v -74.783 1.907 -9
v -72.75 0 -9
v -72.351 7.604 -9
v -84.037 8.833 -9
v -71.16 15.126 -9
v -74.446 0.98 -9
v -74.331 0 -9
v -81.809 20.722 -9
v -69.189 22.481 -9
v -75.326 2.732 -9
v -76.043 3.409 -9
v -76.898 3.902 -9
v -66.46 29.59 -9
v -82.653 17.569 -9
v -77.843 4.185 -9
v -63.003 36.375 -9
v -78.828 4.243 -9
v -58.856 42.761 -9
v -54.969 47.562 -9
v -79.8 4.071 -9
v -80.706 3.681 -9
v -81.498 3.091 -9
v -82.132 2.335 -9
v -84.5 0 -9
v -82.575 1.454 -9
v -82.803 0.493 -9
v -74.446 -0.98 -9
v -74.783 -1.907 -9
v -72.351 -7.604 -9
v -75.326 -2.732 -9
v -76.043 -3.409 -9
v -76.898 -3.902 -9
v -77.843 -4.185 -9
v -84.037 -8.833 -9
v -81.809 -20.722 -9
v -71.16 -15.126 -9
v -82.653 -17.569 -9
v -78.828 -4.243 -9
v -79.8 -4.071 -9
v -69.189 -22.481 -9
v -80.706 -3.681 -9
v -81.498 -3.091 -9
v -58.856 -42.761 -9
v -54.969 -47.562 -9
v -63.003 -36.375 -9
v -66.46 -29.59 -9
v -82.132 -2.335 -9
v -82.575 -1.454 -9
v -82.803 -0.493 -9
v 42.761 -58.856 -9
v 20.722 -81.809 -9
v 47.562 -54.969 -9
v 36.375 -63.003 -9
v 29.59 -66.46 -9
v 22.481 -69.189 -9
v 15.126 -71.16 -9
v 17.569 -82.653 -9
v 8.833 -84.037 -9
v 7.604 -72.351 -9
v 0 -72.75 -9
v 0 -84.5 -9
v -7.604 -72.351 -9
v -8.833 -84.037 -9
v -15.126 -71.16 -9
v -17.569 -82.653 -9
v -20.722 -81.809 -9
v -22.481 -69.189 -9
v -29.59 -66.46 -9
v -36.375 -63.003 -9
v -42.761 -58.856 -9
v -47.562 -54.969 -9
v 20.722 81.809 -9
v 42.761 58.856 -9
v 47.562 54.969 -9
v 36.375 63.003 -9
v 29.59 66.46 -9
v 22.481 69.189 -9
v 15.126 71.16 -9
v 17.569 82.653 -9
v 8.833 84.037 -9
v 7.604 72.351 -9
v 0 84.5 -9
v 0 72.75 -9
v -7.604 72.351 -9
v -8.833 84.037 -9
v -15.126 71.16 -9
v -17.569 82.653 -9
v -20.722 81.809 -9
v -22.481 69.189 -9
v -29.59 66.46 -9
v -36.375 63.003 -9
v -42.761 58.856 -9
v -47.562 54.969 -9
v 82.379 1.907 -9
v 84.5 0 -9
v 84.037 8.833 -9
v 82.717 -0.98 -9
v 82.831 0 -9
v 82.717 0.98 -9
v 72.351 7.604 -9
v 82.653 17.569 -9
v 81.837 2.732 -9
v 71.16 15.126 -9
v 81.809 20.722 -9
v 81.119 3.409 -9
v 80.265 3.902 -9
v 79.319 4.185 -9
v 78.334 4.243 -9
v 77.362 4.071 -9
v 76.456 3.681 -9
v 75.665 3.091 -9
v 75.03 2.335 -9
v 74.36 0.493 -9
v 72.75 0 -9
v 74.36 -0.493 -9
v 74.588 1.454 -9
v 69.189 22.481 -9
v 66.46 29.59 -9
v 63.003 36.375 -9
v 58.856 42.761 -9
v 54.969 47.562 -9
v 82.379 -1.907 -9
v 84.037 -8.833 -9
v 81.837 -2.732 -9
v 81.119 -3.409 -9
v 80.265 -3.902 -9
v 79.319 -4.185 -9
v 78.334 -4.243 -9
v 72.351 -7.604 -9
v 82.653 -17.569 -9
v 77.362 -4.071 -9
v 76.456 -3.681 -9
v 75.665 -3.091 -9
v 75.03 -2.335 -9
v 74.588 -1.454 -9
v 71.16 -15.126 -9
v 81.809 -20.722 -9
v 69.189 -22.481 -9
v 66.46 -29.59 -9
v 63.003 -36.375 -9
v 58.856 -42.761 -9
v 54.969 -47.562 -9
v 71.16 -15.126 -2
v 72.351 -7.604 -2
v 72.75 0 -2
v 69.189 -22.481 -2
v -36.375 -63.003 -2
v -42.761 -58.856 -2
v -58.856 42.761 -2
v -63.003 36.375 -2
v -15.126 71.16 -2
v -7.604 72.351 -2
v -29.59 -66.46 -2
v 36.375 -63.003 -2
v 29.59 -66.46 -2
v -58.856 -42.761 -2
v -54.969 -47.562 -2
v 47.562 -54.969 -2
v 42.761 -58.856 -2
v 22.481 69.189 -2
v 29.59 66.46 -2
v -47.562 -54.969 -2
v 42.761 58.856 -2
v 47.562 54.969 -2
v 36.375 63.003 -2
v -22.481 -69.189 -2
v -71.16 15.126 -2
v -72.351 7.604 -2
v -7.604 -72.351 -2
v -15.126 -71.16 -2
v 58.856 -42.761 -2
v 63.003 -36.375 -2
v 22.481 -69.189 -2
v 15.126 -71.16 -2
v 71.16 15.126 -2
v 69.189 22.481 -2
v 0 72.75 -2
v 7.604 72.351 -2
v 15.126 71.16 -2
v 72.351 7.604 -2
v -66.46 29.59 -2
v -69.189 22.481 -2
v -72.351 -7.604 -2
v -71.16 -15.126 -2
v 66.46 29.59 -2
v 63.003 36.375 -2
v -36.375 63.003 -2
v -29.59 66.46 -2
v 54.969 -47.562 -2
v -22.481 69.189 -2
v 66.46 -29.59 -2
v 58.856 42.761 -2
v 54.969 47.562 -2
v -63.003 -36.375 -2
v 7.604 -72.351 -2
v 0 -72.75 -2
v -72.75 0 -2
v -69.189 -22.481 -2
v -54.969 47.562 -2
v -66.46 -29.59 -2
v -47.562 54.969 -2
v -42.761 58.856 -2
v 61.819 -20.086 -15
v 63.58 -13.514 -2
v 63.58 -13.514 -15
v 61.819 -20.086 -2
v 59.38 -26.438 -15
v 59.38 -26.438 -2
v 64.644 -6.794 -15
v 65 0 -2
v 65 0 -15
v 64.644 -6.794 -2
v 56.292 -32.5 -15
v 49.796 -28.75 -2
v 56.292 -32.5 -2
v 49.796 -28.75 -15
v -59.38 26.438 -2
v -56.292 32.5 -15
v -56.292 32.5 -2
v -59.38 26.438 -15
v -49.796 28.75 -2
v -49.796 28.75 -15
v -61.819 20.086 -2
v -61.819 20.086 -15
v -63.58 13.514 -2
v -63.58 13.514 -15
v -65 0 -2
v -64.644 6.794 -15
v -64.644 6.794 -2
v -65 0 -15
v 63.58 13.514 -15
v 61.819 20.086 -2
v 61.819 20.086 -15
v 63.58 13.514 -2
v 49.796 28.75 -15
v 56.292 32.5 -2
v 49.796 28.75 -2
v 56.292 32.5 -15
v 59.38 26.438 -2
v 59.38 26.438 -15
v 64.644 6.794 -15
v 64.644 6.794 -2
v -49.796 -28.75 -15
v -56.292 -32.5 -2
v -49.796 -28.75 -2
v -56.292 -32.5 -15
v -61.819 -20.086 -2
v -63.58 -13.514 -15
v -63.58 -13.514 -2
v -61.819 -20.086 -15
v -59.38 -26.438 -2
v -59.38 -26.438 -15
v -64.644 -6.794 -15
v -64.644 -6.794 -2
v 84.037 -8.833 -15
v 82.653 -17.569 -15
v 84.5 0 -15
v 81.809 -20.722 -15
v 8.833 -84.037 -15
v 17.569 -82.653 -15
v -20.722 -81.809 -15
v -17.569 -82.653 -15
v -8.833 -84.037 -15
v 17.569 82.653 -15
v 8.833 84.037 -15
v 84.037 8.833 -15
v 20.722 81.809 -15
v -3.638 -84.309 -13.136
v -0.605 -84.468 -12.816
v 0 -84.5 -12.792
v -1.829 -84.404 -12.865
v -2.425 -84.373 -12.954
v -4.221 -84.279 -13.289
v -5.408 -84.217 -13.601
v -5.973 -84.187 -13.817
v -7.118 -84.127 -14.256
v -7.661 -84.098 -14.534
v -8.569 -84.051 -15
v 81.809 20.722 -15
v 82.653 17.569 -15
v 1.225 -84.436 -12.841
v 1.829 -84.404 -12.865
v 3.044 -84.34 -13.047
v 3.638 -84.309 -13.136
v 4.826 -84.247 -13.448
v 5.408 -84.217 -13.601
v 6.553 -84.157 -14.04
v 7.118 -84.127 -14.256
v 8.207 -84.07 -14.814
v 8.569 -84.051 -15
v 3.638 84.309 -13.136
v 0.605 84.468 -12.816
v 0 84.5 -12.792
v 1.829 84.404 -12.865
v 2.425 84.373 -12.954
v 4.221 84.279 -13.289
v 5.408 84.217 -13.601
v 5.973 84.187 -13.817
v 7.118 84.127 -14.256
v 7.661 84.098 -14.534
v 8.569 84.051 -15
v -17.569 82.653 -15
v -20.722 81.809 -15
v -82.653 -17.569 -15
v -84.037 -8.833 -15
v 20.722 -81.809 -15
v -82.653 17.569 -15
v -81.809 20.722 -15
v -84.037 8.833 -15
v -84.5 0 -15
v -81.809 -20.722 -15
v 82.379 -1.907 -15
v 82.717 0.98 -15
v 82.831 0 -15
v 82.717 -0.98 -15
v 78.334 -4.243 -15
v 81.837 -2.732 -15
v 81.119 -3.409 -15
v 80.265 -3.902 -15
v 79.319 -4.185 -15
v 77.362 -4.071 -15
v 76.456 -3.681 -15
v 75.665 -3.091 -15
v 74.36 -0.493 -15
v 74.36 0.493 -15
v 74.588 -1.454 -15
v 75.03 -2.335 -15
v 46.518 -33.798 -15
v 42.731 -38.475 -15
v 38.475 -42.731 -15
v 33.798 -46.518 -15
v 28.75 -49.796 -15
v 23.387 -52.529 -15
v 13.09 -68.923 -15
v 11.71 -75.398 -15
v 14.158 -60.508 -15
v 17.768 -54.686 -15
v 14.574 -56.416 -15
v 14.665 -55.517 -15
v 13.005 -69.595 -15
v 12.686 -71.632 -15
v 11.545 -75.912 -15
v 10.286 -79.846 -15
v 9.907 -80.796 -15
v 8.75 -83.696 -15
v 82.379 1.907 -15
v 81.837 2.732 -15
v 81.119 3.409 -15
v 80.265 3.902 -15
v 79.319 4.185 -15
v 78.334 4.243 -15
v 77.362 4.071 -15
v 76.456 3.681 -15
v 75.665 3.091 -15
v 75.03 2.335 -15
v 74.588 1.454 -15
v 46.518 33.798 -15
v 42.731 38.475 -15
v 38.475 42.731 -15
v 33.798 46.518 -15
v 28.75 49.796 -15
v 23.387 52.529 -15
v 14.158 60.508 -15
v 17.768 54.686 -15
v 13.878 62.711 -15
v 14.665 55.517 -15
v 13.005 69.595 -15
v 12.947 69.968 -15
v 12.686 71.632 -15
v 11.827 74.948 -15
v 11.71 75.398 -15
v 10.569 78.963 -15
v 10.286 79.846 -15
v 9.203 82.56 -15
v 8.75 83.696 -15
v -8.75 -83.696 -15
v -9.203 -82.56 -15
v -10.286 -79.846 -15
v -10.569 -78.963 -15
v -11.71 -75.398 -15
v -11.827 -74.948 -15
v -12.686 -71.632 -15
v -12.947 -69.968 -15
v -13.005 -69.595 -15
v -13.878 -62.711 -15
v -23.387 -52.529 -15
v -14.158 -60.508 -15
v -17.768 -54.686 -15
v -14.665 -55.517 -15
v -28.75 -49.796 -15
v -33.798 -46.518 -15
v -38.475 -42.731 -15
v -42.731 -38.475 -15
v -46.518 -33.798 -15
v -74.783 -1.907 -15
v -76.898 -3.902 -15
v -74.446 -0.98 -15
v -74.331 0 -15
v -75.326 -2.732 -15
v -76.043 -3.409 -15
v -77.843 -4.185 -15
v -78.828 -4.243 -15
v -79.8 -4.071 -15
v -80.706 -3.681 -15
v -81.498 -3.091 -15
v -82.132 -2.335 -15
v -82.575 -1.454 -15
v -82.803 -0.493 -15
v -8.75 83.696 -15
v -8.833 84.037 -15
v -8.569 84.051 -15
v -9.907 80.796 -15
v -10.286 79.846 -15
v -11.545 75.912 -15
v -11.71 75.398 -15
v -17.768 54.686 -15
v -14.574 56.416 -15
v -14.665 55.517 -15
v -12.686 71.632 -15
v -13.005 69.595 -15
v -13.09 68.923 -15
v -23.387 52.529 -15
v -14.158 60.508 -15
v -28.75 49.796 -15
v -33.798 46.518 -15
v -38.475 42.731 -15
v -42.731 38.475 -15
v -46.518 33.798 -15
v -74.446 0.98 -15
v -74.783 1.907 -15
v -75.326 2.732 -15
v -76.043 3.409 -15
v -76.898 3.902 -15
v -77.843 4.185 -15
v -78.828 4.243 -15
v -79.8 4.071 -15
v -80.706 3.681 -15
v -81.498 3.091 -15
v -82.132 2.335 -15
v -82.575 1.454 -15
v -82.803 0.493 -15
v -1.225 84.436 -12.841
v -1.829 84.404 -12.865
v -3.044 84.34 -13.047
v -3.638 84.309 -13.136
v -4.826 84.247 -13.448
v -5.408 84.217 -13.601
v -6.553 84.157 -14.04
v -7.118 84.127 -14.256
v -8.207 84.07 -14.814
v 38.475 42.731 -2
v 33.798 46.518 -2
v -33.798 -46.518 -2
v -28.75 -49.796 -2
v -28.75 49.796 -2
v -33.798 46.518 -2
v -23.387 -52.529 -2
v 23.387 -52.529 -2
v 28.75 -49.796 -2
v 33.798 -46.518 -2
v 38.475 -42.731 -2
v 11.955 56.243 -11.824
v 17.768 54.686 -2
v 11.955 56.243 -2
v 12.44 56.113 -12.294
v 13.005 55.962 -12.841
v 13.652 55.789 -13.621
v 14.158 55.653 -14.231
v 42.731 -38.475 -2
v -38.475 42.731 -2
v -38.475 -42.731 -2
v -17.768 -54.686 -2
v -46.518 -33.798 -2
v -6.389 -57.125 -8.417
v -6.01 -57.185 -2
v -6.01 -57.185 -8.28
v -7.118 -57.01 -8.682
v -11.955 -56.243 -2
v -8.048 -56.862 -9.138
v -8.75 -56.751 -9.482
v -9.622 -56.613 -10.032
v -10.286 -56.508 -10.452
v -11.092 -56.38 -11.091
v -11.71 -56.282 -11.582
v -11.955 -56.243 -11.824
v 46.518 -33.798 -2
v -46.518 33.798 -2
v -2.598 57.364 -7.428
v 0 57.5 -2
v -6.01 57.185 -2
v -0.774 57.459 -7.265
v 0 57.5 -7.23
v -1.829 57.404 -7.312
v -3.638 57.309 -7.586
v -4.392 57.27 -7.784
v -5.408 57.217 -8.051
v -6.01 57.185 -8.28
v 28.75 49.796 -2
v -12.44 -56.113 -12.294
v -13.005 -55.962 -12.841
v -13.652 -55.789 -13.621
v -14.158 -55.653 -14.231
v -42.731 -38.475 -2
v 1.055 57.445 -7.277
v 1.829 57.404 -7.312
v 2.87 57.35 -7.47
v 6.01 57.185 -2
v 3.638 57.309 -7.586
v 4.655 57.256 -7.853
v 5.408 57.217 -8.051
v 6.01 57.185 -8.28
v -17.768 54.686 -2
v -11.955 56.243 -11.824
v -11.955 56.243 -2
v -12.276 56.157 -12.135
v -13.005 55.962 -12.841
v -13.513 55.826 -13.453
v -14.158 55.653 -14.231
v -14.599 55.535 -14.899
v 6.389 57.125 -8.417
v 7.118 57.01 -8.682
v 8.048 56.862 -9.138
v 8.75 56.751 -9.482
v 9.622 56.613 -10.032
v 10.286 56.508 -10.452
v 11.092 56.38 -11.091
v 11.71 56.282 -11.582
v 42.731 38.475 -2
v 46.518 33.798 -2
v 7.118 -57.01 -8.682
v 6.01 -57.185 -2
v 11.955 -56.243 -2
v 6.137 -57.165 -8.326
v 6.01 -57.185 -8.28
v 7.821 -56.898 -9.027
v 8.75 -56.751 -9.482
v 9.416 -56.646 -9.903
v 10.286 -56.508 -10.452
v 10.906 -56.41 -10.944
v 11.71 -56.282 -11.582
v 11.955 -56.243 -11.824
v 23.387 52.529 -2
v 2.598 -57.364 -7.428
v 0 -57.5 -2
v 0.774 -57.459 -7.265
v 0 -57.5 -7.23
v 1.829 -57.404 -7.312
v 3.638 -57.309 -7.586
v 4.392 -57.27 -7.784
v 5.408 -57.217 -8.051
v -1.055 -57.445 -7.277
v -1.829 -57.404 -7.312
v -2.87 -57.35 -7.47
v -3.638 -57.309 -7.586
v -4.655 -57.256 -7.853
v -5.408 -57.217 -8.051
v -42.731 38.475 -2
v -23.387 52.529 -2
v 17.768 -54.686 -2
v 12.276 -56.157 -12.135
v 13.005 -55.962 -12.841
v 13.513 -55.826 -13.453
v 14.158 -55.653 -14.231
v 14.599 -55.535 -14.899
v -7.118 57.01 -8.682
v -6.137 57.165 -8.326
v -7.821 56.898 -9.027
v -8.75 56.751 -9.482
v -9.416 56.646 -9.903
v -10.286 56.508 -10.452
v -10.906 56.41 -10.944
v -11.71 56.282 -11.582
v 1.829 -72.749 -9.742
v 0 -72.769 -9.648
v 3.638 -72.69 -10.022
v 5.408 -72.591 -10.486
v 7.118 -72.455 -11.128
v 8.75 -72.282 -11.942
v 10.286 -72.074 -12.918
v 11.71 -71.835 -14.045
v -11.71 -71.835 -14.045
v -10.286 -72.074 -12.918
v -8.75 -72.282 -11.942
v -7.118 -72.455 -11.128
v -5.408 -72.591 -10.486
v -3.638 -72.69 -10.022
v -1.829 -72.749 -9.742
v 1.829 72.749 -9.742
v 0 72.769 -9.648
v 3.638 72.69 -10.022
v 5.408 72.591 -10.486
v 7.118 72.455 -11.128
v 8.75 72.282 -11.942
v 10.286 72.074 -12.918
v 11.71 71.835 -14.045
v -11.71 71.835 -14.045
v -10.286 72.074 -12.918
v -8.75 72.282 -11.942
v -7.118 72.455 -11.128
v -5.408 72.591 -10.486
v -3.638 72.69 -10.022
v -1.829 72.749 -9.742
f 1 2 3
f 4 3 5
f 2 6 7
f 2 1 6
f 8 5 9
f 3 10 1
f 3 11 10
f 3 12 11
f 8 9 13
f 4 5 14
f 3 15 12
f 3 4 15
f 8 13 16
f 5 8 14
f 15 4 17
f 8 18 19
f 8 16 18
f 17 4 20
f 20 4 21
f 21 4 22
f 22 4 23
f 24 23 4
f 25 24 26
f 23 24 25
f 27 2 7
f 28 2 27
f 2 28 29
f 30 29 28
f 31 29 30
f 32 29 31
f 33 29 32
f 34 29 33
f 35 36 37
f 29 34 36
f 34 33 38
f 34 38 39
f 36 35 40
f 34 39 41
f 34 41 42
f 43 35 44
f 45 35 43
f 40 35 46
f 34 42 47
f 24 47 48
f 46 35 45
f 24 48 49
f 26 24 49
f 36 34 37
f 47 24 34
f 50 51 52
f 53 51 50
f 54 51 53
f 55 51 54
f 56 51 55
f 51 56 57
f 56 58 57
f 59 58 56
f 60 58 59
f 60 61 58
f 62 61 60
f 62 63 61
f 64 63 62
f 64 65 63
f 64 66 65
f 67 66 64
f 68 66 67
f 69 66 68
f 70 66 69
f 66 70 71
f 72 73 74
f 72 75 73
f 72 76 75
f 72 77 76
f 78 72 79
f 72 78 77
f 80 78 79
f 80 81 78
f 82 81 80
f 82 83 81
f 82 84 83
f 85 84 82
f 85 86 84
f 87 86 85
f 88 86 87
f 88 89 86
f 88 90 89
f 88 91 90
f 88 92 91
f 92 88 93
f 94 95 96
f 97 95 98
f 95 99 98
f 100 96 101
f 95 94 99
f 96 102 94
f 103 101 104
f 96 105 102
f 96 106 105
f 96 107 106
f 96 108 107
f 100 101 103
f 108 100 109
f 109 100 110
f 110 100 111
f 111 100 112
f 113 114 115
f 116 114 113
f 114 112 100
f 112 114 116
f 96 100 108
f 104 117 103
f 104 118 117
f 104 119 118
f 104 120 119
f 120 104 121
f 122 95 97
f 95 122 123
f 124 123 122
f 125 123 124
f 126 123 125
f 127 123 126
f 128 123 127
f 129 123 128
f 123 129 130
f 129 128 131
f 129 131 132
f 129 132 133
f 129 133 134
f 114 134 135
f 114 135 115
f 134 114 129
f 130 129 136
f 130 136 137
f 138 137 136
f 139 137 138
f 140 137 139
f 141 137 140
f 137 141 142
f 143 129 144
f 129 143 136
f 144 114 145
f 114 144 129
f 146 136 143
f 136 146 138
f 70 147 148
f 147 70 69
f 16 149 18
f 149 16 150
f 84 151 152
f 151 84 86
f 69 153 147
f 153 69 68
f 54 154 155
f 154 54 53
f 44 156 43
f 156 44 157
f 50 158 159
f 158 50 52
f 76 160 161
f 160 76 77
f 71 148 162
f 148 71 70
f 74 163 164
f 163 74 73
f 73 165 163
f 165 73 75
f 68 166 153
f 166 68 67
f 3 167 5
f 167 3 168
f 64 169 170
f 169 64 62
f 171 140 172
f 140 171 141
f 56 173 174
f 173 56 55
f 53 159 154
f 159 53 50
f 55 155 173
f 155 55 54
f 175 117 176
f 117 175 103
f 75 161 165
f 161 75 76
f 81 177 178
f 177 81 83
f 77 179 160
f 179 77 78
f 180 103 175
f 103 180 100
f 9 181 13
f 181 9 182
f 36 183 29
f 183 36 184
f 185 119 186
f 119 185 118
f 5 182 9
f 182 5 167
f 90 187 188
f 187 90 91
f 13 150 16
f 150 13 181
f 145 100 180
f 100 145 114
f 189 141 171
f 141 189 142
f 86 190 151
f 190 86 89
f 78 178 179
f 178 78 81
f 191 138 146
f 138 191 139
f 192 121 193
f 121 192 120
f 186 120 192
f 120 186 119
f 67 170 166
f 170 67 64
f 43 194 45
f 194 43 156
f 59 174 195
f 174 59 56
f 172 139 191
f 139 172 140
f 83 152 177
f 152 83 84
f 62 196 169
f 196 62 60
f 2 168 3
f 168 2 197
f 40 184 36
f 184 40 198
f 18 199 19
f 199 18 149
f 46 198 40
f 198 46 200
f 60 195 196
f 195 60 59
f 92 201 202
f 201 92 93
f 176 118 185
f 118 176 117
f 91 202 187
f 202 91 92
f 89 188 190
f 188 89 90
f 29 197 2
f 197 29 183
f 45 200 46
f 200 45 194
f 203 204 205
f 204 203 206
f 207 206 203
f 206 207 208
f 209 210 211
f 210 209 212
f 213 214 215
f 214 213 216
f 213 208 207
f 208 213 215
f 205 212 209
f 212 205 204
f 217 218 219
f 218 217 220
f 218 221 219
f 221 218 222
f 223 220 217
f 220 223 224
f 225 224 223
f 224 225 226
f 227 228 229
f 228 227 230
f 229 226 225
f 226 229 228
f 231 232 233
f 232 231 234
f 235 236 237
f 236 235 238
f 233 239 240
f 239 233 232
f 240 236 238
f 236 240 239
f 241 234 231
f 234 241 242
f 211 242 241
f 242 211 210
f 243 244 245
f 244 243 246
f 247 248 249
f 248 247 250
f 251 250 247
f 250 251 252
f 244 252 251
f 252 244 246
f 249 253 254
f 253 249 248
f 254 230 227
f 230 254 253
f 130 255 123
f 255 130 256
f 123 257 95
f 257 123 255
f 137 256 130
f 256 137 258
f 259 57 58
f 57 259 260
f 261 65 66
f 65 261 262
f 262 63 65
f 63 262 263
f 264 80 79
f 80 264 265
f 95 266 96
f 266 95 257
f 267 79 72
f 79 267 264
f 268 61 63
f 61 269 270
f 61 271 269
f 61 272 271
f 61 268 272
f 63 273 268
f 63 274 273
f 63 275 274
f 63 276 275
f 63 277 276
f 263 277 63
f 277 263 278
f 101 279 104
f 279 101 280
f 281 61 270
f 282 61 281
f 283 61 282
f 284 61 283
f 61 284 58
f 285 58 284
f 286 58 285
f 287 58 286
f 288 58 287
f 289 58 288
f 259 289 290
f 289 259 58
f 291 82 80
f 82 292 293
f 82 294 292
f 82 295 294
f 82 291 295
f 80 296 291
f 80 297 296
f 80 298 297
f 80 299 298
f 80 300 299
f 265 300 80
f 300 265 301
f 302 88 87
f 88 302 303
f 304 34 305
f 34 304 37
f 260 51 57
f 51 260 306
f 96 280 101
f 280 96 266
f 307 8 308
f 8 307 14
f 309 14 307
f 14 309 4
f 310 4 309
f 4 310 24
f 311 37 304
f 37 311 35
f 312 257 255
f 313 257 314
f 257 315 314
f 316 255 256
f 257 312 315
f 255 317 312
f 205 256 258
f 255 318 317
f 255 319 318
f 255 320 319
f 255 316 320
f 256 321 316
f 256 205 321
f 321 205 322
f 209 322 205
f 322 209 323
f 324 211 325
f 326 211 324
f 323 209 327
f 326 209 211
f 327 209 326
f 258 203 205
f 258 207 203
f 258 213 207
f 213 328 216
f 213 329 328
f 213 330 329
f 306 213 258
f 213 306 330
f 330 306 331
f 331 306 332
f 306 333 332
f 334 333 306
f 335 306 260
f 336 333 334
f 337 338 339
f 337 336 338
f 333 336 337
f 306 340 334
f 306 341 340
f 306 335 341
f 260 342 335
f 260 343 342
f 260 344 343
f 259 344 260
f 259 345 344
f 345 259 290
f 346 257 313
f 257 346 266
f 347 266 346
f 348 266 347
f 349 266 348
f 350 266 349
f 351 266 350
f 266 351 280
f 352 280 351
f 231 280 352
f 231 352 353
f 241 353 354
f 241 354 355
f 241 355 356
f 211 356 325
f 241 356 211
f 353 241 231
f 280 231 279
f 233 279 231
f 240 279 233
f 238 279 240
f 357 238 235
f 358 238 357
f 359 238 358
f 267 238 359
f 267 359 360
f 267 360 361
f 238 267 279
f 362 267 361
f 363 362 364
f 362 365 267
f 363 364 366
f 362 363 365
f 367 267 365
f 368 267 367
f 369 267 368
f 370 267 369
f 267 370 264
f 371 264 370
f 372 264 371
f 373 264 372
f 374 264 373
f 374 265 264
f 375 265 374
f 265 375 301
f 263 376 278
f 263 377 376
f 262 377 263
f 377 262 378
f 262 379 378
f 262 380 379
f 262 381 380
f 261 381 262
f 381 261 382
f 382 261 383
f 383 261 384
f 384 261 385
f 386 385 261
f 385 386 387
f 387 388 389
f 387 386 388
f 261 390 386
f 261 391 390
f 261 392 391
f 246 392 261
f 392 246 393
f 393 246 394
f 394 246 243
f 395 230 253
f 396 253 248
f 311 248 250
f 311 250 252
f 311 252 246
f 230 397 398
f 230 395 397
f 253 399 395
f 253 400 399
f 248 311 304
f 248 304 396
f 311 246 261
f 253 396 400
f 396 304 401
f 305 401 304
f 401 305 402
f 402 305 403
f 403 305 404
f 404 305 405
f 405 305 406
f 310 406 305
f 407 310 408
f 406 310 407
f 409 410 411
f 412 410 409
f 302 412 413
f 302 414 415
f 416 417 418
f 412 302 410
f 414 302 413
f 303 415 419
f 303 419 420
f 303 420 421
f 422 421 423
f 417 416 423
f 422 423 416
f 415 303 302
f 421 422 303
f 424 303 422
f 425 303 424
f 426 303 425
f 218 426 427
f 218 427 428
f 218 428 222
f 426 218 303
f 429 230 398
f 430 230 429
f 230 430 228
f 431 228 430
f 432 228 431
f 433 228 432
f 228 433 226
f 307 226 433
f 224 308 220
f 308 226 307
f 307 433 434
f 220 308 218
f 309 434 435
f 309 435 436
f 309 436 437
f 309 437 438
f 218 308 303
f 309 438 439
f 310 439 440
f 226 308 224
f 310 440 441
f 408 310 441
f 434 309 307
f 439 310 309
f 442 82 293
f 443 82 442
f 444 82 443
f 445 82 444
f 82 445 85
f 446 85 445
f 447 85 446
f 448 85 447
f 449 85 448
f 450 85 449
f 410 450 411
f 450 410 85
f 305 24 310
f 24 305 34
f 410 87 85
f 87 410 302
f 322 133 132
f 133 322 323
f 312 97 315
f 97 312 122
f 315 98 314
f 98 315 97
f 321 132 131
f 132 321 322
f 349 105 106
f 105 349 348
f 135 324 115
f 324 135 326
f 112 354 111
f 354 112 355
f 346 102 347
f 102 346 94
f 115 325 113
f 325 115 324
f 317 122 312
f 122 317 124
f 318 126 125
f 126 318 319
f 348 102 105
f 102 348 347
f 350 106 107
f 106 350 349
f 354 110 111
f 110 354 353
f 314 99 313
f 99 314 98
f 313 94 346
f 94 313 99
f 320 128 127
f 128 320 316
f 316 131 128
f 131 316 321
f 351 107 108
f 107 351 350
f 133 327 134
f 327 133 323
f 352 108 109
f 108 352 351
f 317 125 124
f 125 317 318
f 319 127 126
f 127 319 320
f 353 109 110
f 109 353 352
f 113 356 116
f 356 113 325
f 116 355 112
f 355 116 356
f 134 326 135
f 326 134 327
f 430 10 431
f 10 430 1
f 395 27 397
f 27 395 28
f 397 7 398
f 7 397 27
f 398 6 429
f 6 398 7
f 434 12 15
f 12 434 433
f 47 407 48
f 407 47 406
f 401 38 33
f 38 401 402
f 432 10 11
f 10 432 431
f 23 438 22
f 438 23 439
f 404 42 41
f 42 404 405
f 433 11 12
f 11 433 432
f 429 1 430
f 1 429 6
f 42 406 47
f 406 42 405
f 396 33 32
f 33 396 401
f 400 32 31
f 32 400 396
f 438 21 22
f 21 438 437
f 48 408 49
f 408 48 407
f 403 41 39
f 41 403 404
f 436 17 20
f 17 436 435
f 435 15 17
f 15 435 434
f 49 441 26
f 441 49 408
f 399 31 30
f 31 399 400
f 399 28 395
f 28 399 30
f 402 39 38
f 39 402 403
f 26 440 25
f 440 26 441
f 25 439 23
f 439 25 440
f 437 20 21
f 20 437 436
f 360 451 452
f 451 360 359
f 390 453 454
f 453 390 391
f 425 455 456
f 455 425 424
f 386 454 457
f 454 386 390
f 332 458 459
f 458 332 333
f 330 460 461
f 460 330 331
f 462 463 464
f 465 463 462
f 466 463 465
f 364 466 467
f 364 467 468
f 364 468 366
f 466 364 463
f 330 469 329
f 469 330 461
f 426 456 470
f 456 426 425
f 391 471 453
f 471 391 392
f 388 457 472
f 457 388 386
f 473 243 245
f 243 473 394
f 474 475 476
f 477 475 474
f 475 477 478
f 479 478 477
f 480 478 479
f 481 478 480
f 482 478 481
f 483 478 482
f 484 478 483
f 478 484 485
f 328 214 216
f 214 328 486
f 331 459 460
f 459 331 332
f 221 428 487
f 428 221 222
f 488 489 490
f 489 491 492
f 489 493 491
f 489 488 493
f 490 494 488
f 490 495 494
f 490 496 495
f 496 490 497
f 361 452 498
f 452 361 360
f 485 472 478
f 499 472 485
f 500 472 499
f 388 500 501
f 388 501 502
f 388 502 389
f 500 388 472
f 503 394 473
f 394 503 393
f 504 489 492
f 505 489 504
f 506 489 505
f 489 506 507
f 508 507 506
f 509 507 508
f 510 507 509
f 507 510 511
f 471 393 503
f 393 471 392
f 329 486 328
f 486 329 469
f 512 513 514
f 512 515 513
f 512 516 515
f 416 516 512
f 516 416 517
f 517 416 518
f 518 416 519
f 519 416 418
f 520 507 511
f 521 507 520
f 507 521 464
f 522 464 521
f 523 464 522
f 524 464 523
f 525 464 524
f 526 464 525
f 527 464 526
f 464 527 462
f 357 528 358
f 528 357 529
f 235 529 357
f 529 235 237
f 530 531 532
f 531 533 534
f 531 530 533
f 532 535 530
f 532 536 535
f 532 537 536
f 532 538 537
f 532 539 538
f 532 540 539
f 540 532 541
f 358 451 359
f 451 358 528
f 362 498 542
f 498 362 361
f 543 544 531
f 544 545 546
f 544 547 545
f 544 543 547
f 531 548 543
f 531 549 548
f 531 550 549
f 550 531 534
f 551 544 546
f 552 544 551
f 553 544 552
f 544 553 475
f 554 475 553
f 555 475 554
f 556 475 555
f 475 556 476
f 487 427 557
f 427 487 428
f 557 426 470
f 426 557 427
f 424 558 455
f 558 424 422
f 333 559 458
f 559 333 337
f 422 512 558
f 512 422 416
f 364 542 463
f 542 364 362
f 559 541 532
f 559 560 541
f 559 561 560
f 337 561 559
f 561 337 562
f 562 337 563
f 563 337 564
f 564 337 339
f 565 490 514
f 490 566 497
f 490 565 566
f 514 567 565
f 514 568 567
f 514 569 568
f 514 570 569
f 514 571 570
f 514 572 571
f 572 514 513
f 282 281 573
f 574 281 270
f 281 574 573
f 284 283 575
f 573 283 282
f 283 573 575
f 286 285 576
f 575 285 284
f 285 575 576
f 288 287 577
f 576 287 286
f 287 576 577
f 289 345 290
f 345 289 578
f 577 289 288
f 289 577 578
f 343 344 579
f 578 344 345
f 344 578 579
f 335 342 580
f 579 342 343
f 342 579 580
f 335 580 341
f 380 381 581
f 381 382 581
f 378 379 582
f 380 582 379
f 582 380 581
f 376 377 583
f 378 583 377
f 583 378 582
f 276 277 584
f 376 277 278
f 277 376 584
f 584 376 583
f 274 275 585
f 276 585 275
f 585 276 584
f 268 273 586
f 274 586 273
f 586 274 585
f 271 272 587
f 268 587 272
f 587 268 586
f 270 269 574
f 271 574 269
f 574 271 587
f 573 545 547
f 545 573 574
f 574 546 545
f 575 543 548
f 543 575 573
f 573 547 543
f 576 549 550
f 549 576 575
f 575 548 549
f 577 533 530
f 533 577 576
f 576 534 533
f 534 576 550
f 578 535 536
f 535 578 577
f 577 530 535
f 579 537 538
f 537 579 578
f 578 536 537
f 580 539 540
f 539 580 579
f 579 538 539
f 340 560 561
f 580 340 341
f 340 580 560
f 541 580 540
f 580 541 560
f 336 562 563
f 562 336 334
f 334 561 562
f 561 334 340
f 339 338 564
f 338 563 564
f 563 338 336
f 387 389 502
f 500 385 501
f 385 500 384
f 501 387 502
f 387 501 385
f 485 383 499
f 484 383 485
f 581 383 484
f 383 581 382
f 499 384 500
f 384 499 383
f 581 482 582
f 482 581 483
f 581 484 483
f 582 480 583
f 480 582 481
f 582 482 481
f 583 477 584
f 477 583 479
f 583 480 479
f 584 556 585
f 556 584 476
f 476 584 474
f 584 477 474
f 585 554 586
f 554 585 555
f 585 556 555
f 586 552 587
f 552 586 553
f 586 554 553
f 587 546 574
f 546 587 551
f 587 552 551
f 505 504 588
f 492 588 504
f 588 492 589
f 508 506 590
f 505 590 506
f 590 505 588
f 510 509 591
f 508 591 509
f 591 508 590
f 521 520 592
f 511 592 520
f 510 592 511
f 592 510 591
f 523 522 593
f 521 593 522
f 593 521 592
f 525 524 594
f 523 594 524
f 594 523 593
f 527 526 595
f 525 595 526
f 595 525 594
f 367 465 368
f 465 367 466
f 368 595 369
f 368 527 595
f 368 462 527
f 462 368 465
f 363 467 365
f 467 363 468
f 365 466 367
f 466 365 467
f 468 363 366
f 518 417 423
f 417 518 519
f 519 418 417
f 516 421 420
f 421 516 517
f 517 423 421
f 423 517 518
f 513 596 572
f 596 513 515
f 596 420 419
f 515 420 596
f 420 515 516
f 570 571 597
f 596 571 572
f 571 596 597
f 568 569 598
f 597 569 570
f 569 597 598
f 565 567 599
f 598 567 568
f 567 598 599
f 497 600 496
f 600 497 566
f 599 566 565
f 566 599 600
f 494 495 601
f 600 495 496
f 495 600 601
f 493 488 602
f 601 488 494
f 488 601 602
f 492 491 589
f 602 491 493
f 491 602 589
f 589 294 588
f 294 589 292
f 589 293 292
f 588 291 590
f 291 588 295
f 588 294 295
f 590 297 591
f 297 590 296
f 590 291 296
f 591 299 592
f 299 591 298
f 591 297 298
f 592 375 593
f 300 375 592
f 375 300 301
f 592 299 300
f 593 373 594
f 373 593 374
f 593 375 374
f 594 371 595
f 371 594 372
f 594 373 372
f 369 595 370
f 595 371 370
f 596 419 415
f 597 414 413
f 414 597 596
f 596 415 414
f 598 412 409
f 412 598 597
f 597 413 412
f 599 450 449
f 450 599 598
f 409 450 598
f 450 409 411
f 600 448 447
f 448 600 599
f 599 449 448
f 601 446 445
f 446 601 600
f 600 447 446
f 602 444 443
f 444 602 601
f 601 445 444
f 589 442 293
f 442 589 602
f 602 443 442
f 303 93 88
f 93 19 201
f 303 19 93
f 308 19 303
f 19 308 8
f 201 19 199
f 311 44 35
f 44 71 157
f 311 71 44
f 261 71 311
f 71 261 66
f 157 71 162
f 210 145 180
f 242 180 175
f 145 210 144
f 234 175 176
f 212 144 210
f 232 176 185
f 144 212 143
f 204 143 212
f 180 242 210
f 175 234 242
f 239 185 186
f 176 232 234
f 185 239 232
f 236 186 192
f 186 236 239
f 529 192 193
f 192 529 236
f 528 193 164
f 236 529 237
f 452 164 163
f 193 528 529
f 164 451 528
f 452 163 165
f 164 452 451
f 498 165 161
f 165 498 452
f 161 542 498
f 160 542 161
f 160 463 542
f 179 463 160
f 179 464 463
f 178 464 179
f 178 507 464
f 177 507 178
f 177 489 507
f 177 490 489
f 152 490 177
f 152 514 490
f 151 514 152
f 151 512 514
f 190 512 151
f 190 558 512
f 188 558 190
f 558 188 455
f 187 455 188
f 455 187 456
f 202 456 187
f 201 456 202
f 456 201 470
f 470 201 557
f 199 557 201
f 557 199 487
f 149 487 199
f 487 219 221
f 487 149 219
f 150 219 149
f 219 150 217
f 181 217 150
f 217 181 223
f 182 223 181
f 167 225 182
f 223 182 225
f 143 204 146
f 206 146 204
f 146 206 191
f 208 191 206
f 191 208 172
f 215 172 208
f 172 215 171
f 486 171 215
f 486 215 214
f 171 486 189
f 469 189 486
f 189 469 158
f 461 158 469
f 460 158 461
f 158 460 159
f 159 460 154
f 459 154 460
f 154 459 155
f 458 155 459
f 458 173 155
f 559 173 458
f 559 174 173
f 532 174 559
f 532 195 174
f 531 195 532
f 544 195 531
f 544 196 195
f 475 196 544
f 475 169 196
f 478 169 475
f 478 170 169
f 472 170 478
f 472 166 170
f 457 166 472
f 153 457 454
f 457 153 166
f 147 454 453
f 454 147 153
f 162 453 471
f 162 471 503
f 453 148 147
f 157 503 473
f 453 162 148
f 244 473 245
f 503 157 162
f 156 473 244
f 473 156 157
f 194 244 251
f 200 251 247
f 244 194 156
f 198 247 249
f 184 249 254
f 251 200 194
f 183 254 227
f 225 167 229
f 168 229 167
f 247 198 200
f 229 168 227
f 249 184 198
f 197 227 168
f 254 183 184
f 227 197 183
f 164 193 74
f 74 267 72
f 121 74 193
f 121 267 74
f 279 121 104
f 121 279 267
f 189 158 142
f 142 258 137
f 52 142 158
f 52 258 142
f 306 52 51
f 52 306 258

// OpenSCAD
$fs = 1;
$fa = 6;

module tire(args) {
  translate([0, 0, 350]) rotate([0, 90, 0]) rotate_extrude() {
    translate([350 - 35/2, 0, 0]) circle(d=35);
  }
}

module innerRing(args) {
  difference() {
    cylinder(d=146 + 24, h=9, center=false);
    cylinder(d=145.5, h=100, center=true);
  }
}

holeD = (6 + 3/16) * 25.4;

rotate([180,0,0]) // flip for printing
intersection() {
  difference() {
    cylinder(d=145 + 24, h=15, center=false);
    innerRing();

    translate([holeD/2,0,0]) cylinder(d=8.5, h=100, center=true);
    translate([-holeD/2,0,0]) cylinder(d=8.5, h=100, center=true);

    for (angle=[30, -30]) {
      for (div=[4, -4]) {
        rotate_extrude(angle = angle) {
          translate([130/div,0,0]) square(size=[130/2, 100], center=true);
        }
      }
    }


    cylinder(d=115, h=100, center=true);;
    translate([0,0,2]) tire();
  }

  translate([0,0,77]) rotate([0,0,45]) cube(size=[145, 145, 150], center=true);
}

*difference() {
  cylinder(d=16, h=12, center=true);
  cylinder(d=9, h=100, center=true);
  rotate_extrude() translate([14,0,0]) circle(d=15);
}

*translate([25,0,0]) difference() {
  cylinder(d=14, h=12, center=true);
  cylinder(d=5.5, h=100, center=true);
  rotate_extrude() translate([13,0,0]) circle(d=15);
}
